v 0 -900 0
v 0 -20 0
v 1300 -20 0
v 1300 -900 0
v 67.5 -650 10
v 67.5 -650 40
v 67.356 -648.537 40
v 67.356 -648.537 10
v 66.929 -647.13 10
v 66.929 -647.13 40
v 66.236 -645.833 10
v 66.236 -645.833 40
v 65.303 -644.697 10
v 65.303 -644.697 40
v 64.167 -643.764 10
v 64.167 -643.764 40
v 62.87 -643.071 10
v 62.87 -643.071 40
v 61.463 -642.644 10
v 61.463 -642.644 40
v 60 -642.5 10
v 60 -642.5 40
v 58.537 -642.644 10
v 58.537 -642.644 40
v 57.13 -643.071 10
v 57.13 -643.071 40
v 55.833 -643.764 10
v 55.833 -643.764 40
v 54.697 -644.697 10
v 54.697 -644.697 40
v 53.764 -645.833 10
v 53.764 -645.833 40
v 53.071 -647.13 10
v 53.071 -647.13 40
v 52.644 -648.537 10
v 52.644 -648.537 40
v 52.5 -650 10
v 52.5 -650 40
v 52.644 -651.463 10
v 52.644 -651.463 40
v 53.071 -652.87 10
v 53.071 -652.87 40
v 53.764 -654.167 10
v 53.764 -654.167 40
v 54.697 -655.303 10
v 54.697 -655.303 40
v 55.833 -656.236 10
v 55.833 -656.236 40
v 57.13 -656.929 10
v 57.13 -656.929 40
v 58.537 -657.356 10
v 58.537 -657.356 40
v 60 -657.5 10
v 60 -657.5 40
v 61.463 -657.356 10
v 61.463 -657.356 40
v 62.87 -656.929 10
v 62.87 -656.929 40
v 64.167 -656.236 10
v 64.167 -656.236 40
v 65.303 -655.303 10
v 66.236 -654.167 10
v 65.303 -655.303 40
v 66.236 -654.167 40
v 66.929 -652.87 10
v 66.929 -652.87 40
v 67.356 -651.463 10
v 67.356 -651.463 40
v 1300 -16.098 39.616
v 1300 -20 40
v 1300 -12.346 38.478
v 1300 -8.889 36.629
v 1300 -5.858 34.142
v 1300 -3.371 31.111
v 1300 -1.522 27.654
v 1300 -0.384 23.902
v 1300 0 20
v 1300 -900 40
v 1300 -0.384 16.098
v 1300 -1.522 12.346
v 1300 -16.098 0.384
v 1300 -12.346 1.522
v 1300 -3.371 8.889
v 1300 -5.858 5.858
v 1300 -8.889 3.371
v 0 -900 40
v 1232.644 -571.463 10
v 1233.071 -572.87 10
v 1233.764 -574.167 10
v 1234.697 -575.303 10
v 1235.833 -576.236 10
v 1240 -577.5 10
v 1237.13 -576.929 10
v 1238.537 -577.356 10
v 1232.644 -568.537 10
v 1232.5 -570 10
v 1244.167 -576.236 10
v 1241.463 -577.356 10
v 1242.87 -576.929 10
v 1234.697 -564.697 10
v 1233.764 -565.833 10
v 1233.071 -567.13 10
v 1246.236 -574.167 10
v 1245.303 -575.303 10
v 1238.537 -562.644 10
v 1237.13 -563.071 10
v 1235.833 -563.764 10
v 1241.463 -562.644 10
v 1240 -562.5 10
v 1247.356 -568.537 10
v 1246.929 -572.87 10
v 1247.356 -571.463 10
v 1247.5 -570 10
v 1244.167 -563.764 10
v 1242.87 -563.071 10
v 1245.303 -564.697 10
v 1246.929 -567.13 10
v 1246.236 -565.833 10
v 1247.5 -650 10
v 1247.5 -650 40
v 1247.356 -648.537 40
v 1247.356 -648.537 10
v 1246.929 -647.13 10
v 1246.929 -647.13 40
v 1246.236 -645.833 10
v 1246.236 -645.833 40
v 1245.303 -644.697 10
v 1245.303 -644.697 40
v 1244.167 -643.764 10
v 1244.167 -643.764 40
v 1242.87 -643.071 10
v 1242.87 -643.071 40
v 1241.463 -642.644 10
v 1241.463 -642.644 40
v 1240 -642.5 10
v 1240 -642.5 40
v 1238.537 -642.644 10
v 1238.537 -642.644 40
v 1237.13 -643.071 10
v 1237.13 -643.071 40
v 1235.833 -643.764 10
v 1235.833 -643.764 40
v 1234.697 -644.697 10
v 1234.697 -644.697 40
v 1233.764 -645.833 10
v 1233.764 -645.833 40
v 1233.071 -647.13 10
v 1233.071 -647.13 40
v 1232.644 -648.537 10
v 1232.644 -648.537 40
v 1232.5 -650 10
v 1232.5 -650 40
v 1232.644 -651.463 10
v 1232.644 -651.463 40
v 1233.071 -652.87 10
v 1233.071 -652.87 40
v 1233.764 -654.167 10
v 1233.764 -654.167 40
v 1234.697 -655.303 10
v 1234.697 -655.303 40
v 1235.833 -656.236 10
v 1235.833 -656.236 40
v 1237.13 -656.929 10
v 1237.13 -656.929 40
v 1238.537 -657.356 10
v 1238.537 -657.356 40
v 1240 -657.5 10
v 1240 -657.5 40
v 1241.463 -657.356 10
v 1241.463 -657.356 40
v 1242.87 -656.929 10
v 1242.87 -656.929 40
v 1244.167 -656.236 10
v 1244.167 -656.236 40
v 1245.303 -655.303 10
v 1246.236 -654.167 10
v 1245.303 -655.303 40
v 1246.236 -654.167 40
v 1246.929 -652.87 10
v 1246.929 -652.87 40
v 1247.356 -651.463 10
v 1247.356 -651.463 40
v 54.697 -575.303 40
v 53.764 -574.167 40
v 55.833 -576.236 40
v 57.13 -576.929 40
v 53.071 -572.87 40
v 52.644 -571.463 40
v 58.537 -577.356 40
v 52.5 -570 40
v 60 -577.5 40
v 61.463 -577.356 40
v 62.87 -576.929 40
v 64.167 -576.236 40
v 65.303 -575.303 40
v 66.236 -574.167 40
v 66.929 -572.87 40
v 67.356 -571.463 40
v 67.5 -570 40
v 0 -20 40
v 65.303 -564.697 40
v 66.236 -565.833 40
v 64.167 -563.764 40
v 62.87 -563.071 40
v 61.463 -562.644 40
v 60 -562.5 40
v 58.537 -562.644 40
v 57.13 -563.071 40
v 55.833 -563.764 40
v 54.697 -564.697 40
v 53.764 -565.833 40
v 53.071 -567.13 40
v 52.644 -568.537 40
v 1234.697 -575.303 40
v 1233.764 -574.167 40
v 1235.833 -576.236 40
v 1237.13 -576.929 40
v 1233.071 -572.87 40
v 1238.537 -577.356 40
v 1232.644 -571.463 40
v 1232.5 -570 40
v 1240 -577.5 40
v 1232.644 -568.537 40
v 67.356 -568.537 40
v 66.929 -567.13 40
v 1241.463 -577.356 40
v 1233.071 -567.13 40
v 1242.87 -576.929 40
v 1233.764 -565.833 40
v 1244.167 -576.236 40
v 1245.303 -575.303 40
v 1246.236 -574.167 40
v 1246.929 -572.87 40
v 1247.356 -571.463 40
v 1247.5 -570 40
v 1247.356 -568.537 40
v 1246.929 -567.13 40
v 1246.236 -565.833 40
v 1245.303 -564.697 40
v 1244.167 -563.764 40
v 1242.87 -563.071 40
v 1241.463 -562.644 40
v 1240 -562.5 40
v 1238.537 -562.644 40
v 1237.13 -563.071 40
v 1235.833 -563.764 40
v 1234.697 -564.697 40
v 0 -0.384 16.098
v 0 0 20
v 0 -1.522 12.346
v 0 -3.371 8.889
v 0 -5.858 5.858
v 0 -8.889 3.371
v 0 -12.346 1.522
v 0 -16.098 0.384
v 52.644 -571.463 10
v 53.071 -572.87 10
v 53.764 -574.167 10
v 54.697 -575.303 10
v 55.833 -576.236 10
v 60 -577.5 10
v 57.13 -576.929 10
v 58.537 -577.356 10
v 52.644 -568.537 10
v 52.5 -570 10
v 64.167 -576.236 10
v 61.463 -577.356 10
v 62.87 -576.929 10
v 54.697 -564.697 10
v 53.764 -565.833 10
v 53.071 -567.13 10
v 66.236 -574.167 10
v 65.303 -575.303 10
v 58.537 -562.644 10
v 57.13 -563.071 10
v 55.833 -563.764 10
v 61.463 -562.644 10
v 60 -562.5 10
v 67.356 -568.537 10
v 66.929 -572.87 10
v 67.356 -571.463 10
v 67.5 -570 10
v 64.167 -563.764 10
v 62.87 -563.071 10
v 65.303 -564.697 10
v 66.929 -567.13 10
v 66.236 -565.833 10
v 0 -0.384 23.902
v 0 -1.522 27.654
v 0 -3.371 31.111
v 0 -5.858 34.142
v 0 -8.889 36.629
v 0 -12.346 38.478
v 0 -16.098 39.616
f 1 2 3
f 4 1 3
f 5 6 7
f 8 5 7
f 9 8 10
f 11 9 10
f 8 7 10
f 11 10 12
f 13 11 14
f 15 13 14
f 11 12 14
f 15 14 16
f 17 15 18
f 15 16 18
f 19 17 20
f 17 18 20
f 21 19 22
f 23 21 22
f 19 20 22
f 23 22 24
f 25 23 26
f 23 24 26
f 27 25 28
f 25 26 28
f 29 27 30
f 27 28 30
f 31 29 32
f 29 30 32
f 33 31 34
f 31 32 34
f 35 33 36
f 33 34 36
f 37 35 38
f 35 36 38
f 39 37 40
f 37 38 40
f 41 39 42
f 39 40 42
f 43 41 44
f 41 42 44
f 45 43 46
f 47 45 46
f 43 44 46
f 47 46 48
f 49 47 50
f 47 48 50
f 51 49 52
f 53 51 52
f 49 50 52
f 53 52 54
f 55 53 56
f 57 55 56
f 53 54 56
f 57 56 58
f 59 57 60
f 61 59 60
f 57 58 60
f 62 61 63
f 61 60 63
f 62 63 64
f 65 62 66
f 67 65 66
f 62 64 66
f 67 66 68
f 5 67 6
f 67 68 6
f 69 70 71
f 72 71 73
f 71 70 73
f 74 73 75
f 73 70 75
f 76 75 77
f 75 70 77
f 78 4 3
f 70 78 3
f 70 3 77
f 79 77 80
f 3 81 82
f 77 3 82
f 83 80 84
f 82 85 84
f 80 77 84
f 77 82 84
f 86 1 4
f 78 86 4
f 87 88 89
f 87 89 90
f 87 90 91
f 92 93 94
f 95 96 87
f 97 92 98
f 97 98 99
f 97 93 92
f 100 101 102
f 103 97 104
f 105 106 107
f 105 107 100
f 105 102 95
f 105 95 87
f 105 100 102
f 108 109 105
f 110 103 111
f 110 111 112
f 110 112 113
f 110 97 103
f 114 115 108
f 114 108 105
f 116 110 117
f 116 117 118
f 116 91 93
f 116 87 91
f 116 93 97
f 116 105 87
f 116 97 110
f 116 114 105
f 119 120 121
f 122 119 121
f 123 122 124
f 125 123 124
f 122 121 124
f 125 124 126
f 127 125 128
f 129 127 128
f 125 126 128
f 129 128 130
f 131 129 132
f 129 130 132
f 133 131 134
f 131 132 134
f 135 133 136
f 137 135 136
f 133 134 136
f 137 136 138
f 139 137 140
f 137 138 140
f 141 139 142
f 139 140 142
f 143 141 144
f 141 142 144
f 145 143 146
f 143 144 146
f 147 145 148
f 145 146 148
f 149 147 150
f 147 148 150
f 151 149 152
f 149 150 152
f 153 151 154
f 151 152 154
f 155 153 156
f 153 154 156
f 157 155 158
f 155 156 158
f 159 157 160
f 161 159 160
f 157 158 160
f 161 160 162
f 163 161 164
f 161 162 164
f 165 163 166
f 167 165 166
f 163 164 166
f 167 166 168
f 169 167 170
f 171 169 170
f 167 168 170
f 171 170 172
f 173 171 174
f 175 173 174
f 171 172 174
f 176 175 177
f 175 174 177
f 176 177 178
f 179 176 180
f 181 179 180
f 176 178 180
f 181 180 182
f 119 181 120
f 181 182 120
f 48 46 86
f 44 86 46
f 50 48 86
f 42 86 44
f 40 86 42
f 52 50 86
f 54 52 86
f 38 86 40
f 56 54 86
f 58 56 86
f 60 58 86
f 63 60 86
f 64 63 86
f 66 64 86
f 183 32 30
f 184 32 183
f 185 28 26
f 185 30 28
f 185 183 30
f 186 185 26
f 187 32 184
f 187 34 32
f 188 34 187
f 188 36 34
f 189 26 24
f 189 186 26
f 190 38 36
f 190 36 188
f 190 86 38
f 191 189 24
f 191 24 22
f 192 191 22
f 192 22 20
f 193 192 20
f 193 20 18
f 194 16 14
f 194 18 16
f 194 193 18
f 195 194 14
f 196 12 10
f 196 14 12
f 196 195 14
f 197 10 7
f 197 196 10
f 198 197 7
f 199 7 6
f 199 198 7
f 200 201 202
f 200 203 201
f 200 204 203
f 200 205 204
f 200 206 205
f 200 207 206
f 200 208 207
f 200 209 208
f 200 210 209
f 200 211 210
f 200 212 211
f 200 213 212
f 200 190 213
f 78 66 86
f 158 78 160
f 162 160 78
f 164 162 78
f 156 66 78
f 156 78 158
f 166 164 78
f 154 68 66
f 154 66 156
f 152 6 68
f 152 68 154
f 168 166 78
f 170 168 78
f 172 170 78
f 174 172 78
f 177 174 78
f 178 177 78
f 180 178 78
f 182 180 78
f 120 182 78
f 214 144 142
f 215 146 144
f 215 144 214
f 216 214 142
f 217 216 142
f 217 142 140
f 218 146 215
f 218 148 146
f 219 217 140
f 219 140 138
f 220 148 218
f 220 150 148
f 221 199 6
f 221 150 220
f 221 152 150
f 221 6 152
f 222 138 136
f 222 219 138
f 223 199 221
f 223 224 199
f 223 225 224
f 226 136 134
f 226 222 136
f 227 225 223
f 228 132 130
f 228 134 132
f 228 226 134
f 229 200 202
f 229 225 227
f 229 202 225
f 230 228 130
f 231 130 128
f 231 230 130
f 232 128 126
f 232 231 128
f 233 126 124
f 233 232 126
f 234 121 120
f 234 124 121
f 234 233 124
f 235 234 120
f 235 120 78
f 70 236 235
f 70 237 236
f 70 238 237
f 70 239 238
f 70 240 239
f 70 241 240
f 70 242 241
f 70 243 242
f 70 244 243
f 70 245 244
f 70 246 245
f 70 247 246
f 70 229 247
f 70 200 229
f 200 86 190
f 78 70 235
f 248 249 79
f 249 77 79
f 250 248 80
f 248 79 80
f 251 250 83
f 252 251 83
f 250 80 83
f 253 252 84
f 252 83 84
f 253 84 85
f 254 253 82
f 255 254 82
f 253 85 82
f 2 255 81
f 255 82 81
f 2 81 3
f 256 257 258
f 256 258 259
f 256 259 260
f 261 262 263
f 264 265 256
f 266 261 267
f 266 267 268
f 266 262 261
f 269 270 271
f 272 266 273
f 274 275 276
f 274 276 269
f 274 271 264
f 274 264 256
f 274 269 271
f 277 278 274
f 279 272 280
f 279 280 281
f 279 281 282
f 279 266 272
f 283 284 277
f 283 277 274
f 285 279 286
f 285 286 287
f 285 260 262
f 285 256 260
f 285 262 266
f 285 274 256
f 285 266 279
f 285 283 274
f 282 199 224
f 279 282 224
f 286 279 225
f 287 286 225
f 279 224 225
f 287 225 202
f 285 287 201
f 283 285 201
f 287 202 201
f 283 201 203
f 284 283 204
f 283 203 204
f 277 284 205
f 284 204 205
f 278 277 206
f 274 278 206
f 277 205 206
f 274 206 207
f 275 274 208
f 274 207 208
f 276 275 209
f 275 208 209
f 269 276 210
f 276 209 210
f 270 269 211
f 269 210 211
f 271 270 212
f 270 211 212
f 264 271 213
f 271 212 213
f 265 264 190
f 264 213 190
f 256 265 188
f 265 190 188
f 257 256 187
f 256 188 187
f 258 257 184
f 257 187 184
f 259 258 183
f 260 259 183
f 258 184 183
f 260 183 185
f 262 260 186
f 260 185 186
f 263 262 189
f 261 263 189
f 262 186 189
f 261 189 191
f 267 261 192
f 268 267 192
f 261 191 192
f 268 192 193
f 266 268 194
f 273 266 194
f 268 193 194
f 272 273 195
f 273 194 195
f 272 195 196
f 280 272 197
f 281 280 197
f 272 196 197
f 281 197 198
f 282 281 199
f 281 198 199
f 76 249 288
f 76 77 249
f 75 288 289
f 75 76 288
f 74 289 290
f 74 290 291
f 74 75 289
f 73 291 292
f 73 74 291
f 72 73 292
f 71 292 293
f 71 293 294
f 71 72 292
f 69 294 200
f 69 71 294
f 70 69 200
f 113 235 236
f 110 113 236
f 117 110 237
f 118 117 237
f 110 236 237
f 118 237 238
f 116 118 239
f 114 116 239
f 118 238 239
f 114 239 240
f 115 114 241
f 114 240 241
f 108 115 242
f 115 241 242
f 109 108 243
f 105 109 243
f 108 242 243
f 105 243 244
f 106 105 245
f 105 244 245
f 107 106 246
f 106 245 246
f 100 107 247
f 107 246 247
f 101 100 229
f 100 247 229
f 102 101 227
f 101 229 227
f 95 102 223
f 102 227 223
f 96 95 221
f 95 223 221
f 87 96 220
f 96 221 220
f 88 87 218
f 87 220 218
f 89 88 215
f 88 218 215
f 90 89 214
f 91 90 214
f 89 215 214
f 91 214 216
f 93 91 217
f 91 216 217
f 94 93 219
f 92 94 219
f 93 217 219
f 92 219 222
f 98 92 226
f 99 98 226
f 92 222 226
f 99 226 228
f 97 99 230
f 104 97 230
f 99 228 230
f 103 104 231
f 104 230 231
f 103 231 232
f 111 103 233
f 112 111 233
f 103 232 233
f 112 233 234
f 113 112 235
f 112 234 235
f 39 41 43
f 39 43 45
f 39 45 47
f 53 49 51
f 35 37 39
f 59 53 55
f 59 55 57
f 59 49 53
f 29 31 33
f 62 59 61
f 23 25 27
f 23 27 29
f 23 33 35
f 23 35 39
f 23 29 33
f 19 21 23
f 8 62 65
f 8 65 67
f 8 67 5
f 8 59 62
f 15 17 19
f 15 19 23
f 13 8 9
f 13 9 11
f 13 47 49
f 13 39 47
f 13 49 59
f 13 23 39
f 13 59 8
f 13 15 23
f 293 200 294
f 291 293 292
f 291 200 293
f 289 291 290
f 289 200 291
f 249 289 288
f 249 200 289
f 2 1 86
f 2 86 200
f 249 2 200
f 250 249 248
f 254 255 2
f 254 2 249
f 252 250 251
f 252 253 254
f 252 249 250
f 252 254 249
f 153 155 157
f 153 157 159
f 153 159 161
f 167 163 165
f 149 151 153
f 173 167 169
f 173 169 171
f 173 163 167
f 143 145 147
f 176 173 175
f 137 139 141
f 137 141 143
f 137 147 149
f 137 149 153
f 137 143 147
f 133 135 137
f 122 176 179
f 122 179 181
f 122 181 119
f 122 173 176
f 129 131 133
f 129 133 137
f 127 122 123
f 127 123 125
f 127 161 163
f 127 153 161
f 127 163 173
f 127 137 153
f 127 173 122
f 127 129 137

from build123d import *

# Parameters (mm, degrees)
SCHIZZO1_W                   = 1300
SCHIZZO1_H                   = 900
ESTRUSIONE_ESTRUSIONE1_DEPTH = 40
RACCORDO1_R                  = 20
SCHIZZO2_R                   = 7.5
TAGLIO_ESTRUSIONE1_DEPTH     = 30


with BuildPart() as part:
    # Schizzo1 → Estrusione-Estrusione1 (new body)
    with BuildSketch(Plane.XY):
        with Locations((650, -450)):
            Rectangle(SCHIZZO1_W, SCHIZZO1_H)
    extrude(amount=ESTRUSIONE_ESTRUSIONE1_DEPTH)

    # Raccordo1
    raccordo1_edges = [part.edges().sort_by_distance(p)[0] for p in [
        (650, 0, 0),
        (650, 0, 40),
    ]]
    fillet(raccordo1_edges, radius=RACCORDO1_R - 0.0001)  # a hair under: the kernel refuses the full size

    # Schizzo2 → Taglio-Estrusione1 (cut)
    with BuildSketch(Plane.XY.offset(40)):
        with Locations((60, -650)):
            Circle(SCHIZZO2_R)
        with Locations((60, -570)):
            Circle(SCHIZZO2_R)
        with Locations((1240, -650)):
            Circle(SCHIZZO2_R)
        with Locations((1240, -570)):
            Circle(SCHIZZO2_R)
    extrude(amount=-TAGLIO_ESTRUSIONE1_DEPTH, mode=Mode.SUBTRACT)


solid = part.part
